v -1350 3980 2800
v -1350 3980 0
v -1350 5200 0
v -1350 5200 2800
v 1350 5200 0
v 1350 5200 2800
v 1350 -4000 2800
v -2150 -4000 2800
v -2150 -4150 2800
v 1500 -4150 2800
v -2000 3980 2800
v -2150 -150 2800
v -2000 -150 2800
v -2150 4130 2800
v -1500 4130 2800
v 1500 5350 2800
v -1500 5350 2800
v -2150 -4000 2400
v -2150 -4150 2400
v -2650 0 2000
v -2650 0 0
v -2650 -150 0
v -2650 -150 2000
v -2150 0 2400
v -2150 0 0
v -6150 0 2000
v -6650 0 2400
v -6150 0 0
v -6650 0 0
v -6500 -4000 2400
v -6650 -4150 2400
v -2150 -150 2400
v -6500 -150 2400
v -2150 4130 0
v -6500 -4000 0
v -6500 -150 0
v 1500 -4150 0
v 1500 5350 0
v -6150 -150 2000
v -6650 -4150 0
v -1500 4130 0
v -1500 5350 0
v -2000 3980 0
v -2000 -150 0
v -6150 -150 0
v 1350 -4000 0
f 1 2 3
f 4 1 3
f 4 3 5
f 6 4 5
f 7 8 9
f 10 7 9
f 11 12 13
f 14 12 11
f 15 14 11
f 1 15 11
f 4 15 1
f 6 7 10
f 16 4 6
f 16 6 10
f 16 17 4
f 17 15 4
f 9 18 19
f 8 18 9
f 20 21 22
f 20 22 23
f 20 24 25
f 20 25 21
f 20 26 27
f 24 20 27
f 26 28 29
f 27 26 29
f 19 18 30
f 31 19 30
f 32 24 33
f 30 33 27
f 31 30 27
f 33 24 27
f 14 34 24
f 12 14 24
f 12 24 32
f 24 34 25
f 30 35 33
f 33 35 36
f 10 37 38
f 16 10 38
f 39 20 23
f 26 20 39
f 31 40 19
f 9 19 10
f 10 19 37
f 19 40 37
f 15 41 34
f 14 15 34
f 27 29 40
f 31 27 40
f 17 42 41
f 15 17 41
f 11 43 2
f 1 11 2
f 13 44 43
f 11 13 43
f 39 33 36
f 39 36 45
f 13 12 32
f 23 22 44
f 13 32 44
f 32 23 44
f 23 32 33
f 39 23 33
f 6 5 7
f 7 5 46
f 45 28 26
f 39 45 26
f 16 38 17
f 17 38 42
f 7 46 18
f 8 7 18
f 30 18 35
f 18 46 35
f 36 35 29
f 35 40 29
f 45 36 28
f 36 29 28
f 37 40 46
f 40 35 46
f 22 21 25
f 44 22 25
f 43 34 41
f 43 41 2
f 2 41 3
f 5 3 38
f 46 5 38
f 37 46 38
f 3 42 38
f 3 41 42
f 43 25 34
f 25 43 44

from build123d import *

# Parameters (mm, degrees)
F1_DEPTH = 2800
F2_W     = 4500
F2_H     = 400
F3_DEPTH = 4170
F4_W     = 3500
F4_H     = 2000
F5_DEPTH = 160


with BuildPart() as f1:
    # F0 (on Top) → F1 (new body)
    with BuildSketch(Plane.XY):
        Polygon((1500, 5350), (-1500, 5350), (-1500, 4130), (-2150, 4130), (-2150, 0), (-6650, 0), (-6650, -4150), (1500, -4150), align=None)
        Polygon((-1350, 3980), (-1350, 5200), (1350, 5200), (1350, -4000), (-6500, -4000), (-6500, -150), (-2000, -150), (-2000, 3980), align=None, mode=Mode.SUBTRACT)
    extrude(amount=F1_DEPTH)

    # F2 (on face) → F3 (cut)
    with BuildSketch(Plane(origin=(0, 0, 0), x_dir=(-1, 0, 0), z_dir=(0, 1, 0))):
        with Locations((4400, 2600)):
            Rectangle(F2_W, F2_H)
    extrude(amount=-F3_DEPTH, mode=Mode.SUBTRACT)

    # F4 (on face) → F5 (cut)
    with BuildSketch(Plane(origin=(0, 0, 0), x_dir=(-1, 0, 0), z_dir=(0, 1, 0))):
        with Locations((4400, 1000)):
            Rectangle(F4_W, F4_H)
    extrude(amount=-F5_DEPTH, mode=Mode.SUBTRACT)


solid = f1.part
